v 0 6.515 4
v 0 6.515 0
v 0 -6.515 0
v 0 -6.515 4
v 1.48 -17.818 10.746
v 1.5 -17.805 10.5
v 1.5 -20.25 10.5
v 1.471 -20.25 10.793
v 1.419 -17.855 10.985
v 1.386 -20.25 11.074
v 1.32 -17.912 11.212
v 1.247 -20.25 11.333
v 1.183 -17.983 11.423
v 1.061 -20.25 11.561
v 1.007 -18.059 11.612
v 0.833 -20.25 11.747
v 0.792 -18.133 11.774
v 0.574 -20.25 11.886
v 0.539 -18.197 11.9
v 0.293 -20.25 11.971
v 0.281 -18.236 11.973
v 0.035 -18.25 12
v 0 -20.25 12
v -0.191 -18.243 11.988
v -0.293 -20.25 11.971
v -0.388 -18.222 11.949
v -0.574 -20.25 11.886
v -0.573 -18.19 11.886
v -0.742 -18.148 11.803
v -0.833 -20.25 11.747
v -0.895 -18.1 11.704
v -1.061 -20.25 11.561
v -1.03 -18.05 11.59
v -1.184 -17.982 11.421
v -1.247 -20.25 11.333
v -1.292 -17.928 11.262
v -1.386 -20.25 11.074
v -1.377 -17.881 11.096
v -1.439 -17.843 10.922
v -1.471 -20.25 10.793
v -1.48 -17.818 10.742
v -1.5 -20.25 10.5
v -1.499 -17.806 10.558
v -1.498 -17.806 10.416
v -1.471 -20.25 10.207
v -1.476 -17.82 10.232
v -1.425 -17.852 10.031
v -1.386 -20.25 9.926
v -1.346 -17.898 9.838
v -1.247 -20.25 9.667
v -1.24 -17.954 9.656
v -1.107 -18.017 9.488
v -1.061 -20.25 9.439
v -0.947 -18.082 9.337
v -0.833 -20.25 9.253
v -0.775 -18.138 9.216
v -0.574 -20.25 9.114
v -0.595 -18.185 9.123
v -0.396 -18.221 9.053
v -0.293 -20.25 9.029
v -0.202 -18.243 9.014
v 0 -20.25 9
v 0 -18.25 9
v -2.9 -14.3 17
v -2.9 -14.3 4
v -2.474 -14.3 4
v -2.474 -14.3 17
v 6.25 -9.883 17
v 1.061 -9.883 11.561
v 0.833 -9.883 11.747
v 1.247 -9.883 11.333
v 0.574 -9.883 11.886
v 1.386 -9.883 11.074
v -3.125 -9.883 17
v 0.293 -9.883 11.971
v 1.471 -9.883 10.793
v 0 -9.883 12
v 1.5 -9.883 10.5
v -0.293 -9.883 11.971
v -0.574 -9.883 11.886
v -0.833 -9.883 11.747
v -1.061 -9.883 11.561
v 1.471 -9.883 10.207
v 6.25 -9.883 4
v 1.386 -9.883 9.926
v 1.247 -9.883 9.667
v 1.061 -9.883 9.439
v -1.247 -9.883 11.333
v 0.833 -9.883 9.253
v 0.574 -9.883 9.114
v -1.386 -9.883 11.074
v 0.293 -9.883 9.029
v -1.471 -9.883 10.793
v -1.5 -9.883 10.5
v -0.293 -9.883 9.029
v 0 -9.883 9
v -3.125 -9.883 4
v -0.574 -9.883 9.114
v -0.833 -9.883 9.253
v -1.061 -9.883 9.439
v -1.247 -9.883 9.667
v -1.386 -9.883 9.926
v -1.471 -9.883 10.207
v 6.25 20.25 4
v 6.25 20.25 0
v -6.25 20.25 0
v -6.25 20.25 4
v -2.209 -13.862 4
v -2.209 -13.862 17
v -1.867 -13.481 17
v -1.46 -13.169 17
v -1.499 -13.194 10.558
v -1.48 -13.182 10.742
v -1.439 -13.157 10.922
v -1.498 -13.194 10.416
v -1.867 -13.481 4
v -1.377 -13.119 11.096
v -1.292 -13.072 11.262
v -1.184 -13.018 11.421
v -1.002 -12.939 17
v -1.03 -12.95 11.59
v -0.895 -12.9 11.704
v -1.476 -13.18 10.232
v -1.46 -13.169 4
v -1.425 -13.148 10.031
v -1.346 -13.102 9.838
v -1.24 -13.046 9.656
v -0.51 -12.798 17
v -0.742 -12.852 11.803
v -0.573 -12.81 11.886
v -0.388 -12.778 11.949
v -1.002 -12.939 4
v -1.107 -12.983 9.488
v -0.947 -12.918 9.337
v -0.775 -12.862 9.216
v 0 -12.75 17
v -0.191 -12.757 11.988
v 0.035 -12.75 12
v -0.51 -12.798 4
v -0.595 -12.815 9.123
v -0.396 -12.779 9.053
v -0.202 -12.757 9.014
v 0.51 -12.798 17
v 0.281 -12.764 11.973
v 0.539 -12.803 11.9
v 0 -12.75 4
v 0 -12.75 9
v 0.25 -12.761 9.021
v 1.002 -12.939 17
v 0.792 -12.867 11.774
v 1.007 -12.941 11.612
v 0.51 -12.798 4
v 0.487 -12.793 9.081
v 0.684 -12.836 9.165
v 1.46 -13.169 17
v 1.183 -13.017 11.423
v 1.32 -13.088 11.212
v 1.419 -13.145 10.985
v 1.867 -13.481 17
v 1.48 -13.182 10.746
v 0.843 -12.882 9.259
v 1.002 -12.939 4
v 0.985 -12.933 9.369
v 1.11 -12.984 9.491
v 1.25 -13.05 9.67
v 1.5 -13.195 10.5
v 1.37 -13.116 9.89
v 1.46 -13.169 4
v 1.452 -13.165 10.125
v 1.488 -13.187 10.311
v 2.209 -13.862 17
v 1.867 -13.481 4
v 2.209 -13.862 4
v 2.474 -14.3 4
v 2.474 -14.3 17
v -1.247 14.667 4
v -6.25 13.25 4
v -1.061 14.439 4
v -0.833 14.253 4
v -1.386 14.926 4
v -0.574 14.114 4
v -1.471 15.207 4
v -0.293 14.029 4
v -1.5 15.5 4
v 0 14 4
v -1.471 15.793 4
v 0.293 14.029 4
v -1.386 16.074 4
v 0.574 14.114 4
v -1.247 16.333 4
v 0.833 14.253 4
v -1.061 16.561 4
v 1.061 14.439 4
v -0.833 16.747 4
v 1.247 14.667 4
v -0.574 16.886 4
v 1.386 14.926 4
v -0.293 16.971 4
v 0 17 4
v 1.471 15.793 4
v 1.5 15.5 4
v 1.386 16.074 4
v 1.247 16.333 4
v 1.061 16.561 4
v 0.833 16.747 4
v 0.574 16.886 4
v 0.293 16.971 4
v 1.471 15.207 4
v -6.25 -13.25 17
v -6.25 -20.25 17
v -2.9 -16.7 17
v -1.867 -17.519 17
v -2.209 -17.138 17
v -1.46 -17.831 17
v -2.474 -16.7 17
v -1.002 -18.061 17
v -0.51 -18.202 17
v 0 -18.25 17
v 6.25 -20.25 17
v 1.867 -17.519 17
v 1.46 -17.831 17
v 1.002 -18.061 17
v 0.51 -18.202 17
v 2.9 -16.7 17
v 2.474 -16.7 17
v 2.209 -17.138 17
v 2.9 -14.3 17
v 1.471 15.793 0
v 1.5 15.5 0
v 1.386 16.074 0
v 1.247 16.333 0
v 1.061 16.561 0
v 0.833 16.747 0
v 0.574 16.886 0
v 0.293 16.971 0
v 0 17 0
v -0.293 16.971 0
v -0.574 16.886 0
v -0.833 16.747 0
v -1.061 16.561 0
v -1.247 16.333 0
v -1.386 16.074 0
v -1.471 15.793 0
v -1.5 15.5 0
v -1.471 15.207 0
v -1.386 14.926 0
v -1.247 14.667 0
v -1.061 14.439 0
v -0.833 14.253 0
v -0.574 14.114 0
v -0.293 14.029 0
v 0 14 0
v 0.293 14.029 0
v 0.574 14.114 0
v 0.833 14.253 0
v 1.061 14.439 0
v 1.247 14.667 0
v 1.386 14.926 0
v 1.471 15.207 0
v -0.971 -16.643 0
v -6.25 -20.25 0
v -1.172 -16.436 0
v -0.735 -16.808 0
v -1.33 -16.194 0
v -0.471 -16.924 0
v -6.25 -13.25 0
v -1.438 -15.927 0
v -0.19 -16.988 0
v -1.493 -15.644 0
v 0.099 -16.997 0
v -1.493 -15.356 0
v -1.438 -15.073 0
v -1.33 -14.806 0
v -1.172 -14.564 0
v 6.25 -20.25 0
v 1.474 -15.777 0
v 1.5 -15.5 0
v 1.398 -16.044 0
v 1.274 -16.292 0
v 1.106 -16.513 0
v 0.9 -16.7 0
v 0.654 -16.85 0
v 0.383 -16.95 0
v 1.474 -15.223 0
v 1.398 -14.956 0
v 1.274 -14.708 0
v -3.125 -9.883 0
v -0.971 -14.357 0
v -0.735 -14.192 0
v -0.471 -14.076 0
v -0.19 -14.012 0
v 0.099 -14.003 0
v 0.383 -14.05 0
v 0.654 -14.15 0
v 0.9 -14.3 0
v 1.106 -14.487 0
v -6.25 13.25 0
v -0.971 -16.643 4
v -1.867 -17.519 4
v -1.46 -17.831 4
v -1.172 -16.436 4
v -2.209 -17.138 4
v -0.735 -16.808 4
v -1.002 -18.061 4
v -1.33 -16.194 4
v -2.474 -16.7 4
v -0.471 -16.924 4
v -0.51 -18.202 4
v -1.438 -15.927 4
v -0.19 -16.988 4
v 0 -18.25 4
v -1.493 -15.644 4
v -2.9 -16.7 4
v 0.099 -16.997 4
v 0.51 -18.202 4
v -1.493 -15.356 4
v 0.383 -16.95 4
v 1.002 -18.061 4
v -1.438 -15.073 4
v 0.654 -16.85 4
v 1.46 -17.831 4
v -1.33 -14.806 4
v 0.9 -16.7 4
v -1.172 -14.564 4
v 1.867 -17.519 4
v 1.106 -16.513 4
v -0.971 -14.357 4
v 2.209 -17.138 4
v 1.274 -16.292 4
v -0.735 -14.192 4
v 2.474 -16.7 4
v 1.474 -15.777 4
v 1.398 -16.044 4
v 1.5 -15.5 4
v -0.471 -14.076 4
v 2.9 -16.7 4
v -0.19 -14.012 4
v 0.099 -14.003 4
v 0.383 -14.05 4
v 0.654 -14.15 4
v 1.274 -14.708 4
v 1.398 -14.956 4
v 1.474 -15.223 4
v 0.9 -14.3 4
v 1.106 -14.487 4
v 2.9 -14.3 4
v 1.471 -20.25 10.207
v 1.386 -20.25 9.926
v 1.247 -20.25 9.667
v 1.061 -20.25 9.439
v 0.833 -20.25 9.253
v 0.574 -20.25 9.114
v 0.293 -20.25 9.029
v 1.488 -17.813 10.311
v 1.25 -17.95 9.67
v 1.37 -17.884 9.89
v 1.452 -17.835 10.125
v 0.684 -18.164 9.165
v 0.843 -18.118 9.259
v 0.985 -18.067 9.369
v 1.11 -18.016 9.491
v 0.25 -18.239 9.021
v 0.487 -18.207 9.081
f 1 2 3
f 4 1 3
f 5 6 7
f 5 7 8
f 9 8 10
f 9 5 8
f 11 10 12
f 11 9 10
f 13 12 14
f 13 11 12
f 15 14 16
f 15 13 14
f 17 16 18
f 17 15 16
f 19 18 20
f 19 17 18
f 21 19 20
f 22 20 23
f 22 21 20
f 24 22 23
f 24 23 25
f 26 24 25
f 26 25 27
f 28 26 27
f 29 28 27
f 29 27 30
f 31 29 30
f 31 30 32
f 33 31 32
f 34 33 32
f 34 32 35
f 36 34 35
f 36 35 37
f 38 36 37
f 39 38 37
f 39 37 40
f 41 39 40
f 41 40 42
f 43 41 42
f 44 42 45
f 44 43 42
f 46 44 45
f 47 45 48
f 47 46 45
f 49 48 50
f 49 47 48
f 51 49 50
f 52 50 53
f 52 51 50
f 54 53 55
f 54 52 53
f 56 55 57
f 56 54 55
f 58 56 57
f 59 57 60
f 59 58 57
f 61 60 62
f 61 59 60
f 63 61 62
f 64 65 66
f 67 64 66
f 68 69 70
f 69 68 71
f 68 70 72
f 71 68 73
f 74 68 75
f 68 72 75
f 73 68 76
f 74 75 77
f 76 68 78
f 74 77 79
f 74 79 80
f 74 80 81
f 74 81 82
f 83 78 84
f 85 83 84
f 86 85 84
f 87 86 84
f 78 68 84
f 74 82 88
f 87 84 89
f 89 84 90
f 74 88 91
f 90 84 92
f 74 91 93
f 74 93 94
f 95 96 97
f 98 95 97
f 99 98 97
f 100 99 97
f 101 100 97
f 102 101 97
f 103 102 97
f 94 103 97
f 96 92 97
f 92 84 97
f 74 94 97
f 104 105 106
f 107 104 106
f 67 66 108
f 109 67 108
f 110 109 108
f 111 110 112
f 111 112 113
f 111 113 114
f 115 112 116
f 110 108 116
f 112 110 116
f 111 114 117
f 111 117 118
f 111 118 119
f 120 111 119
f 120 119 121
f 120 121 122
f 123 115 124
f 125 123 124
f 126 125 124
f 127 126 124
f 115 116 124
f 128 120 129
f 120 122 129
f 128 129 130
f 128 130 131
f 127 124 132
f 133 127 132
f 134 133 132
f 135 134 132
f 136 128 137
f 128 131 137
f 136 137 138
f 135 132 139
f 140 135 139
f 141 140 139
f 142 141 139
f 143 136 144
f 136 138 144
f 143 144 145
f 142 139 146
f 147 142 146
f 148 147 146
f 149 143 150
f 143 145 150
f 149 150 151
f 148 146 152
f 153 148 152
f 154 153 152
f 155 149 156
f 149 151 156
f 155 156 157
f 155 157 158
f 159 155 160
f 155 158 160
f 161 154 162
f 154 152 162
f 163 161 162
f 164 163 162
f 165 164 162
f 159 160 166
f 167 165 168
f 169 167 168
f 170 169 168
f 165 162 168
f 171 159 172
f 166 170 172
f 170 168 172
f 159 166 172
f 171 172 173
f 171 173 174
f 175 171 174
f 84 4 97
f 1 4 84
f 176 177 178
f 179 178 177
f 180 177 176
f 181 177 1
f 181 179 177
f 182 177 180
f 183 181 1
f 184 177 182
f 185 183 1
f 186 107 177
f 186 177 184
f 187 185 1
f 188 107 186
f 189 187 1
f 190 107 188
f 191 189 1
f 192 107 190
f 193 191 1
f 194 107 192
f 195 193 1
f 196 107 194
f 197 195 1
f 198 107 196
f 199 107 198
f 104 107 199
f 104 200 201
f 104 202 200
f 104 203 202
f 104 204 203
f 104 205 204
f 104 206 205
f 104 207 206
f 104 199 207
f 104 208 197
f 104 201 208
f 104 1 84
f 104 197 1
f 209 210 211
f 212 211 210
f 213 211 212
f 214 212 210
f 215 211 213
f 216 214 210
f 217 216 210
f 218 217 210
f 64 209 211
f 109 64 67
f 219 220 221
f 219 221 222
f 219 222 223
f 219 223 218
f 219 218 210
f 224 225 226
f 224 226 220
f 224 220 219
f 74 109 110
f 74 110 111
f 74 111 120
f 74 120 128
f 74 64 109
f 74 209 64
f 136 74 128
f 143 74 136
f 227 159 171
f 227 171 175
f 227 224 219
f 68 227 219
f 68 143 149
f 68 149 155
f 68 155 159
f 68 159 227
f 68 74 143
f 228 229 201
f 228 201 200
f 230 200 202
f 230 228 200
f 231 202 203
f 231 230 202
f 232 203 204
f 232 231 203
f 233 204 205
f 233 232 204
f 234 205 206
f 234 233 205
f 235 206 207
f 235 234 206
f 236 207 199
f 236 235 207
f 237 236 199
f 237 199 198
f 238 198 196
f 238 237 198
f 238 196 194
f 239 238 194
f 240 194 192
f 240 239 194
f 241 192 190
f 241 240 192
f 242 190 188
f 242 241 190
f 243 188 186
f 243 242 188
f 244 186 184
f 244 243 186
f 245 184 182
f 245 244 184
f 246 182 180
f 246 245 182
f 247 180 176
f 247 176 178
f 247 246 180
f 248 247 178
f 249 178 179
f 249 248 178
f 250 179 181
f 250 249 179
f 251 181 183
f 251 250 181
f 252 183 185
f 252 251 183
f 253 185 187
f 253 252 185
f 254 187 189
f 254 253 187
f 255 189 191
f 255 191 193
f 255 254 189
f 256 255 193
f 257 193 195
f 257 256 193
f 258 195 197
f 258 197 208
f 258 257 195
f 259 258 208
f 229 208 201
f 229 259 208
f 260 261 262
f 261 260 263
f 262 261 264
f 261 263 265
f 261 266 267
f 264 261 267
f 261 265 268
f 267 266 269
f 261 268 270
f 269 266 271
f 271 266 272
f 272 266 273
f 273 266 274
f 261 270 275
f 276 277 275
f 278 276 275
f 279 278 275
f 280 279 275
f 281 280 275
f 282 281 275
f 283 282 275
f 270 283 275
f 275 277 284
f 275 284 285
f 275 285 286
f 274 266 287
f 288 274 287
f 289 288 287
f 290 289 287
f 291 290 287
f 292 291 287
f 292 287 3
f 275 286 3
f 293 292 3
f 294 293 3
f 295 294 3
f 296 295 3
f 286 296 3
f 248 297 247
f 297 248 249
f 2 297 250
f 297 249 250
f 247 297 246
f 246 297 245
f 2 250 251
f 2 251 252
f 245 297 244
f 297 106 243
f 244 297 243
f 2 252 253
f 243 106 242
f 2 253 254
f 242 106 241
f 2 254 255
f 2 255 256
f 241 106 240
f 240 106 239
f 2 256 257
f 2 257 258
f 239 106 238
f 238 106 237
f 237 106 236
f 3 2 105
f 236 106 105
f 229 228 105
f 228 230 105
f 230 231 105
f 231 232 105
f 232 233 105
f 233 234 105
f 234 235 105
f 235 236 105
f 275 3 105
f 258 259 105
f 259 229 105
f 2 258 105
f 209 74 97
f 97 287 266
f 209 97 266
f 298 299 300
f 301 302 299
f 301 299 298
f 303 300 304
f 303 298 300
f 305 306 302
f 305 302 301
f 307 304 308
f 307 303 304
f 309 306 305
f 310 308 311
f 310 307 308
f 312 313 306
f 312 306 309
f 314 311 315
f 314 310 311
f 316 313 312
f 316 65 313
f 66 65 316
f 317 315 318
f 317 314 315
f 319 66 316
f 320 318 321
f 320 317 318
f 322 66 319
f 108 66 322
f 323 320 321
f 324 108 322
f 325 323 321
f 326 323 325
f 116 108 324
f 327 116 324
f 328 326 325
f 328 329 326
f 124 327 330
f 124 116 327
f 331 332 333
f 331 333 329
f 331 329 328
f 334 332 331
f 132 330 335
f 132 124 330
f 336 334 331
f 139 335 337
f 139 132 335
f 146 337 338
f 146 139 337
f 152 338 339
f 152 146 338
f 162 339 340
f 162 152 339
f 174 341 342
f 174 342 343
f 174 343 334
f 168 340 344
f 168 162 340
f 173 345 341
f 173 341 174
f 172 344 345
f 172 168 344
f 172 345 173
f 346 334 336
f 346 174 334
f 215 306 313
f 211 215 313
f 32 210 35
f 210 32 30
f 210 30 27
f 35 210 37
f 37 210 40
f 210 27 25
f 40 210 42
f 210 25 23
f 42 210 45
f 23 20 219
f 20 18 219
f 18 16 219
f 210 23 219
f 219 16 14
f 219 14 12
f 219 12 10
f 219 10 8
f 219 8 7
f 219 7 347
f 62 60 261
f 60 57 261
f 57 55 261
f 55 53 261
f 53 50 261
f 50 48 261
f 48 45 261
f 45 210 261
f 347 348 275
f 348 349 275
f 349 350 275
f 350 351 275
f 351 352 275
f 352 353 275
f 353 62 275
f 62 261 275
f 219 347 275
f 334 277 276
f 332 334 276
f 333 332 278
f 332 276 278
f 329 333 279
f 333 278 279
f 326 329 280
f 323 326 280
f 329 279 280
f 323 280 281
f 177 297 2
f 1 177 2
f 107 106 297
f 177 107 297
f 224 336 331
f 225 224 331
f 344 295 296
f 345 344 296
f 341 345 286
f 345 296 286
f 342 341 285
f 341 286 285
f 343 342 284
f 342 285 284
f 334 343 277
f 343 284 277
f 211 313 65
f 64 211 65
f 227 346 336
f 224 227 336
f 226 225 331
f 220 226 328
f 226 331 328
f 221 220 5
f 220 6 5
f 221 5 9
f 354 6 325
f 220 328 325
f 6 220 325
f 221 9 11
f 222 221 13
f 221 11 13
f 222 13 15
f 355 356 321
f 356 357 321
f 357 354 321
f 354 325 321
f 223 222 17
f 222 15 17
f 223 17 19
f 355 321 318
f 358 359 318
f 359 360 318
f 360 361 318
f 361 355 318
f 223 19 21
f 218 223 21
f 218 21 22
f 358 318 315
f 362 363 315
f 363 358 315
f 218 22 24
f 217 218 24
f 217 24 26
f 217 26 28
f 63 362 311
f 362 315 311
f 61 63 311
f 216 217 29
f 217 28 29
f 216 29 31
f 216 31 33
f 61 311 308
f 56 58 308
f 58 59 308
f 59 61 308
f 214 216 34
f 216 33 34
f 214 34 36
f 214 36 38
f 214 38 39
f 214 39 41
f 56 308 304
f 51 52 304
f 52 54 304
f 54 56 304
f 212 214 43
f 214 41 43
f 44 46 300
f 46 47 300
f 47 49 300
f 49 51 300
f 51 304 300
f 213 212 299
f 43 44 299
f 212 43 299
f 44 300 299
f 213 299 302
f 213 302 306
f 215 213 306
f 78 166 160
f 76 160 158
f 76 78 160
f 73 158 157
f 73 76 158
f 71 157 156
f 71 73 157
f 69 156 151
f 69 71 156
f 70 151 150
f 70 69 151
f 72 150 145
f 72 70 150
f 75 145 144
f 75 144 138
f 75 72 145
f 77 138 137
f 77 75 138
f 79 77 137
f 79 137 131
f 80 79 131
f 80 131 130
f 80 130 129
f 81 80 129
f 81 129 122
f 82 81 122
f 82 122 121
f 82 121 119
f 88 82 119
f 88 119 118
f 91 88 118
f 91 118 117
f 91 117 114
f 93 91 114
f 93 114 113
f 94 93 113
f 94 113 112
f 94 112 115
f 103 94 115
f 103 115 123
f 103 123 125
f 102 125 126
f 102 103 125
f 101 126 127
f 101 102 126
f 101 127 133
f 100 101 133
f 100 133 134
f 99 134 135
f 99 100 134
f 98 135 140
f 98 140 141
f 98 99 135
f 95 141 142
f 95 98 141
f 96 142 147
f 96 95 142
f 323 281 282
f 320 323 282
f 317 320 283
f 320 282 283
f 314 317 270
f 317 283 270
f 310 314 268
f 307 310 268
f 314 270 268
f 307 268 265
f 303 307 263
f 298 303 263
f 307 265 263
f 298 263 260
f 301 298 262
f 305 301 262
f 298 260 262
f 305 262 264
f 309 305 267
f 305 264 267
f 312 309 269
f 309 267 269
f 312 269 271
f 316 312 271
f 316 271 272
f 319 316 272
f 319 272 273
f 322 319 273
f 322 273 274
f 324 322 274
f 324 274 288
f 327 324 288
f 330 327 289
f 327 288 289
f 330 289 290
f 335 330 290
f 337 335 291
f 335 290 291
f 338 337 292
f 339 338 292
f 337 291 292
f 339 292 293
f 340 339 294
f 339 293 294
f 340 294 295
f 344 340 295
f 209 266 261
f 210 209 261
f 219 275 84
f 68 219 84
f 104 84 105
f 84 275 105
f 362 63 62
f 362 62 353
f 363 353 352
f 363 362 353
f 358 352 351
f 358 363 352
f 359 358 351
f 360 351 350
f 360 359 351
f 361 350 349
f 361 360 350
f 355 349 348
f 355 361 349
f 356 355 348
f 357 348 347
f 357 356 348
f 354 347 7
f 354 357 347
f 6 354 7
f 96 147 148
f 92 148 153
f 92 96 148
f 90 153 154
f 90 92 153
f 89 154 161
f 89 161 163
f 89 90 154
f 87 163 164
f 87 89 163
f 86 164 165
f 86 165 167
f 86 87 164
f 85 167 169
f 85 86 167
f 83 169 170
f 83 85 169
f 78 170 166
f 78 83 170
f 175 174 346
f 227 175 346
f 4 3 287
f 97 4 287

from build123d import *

# Parameters (mm, degrees)
F0_R     = 2.75
F0_R_2   = 1.5
F1_DEPTH = 4
F2_DEPTH = 17
F4_DEPTH = 25


with BuildPart() as f1:
    # F0 (on Top) → F1 (new body)
    with BuildSketch(Plane.XY):
        Polygon((-6.25, -20.25), (6.25, -20.25), (6.25, -9.8827272505), (-3.125, -9.8827272505), (-6.25, -13.25), align=None)
        with BuildLine():
            ThreePointArc((-2.4743686063, -14.3), (0, -12.75), (2.4743686063, -14.3))
            Line((2.4743686063, -14.3), (2.9, -14.3))
            Line((2.9, -14.3), (2.9, -16.7))
            Line((2.9, -16.7), (2.4743686063, -16.7))
            ThreePointArc((2.4743686063, -16.7), (0, -18.25), (-2.4743686063, -16.7))
            Line((-2.4743686063, -16.7), (-2.9, -16.7))
            Line((-2.9, -16.7), (-2.9, -14.3))
            Line((-2.9, -14.3), (-2.4743686063, -14.3))
        make_face(mode=Mode.SUBTRACT)
        Polygon((-3.125, -9.8827272505), (6.25, -9.8827272505), (6.25, -6.5154545009), (0, -6.5154545009), align=None)
        Polygon((0, -6.5154545009), (6.25, -6.5154545009), (6.25, 20.25), (-6.25, 20.25), (-6.25, 13.25), (0, 6.5154545009), (0, 0), align=None)
        with Locations((0, 15.5)):
            Circle(F0_R, mode=Mode.SUBTRACT)
        with Locations((0, 15.5)):
            Circle(F0_R)
        with Locations((0, 15.5)):
            Circle(F0_R_2, mode=Mode.SUBTRACT)
        with BuildLine():
            ThreePointArc((-0.9, -14.3), (0, -14), (0.9, -14.3))
            Line((0.9, -14.3), (2.4743686063, -14.3))
            ThreePointArc((2.4743686063, -14.3), (0, -12.75), (-2.4743686063, -14.3))
            Line((-2.4743686063, -14.3), (-0.9, -14.3))
        make_face()
        with BuildLine():
            ThreePointArc((-0.9, -16.7), (-1.5, -15.5), (-0.9, -14.3))
            Line((-0.9, -14.3), (-2.4743686063, -14.3))
            ThreePointArc((-2.4743686063, -14.3), (-2.75, -15.5), (-2.4743686063, -16.7))
            Line((-2.4743686063, -16.7), (-0.9, -16.7))
        make_face()
        with BuildLine():
            Line((2.4743686063, -16.7), (0.9, -16.7))
            ThreePointArc((0.9, -16.7), (0, -17), (-0.9, -16.7))
            Line((-0.9, -16.7), (-2.4743686063, -16.7))
            ThreePointArc((-2.4743686063, -16.7), (0, -18.25), (2.4743686063, -16.7))
        make_face()
        with BuildLine():
            ThreePointArc((0.9, -14.3), (1.3416407865, -14.8291796068), (1.5, -15.5))
            ThreePointArc((1.5, -15.5), (1.3416407865, -16.1708203932), (0.9, -16.7))
            Line((0.9, -16.7), (2.4743686063, -16.7))
            ThreePointArc((2.4743686063, -16.7), (2.6802064909, -16.1156242087), (2.75, -15.5))
            ThreePointArc((2.75, -15.5), (2.6802064909, -14.8843757913), (2.4743686063, -14.3))
            Line((2.4743686063, -14.3), (0.9, -14.3))
        make_face()
        with BuildLine():
            ThreePointArc((-2.4743686063, -16.7), (-2.75, -15.5), (-2.4743686063, -14.3))
            Line((-2.4743686063, -14.3), (-2.9, -14.3))
            Line((-2.9, -14.3), (-2.9, -16.7))
            Line((-2.9, -16.7), (-2.4743686063, -16.7))
        make_face()
        with BuildLine():
            Line((2.9, -14.3), (2.4743686063, -14.3))
            ThreePointArc((2.4743686063, -14.3), (2.6802064909, -14.8843757913), (2.75, -15.5))
            ThreePointArc((2.75, -15.5), (2.6802064909, -16.1156242087), (2.4743686063, -16.7))
            Line((2.4743686063, -16.7), (2.9, -16.7))
            Line((2.9, -16.7), (2.9, -14.3))
        make_face()
    extrude(amount=F1_DEPTH)

    # F0 (on Top) → F2 (join)
    with BuildSketch(Plane.XY):
        Polygon((-6.25, -20.25), (6.25, -20.25), (6.25, -9.8827272505), (-3.125, -9.8827272505), (-6.25, -13.25), align=None)
        with BuildLine():
            ThreePointArc((-2.4743686063, -14.3), (0, -12.75), (2.4743686063, -14.3))
            Line((2.4743686063, -14.3), (2.9, -14.3))
            Line((2.9, -14.3), (2.9, -16.7))
            Line((2.9, -16.7), (2.4743686063, -16.7))
            ThreePointArc((2.4743686063, -16.7), (0, -18.25), (-2.4743686063, -16.7))
            Line((-2.4743686063, -16.7), (-2.9, -16.7))
            Line((-2.9, -16.7), (-2.9, -14.3))
            Line((-2.9, -14.3), (-2.4743686063, -14.3))
        make_face(mode=Mode.SUBTRACT)
    extrude(amount=F2_DEPTH)

    # F3 (on Front) → F4 (cut)
    with BuildSketch(Plane.XZ):
        with BuildLine():
            ThreePointArc((0, 9), (1.0606601718, 9.4393398282), (1.5, 10.5))
            ThreePointArc((1.5, 10.5), (-1.0606601718, 11.5606601718), (0, 9))
        make_face()
    extrude(amount=F4_DEPTH, mode=Mode.SUBTRACT)


solid = f1.part
